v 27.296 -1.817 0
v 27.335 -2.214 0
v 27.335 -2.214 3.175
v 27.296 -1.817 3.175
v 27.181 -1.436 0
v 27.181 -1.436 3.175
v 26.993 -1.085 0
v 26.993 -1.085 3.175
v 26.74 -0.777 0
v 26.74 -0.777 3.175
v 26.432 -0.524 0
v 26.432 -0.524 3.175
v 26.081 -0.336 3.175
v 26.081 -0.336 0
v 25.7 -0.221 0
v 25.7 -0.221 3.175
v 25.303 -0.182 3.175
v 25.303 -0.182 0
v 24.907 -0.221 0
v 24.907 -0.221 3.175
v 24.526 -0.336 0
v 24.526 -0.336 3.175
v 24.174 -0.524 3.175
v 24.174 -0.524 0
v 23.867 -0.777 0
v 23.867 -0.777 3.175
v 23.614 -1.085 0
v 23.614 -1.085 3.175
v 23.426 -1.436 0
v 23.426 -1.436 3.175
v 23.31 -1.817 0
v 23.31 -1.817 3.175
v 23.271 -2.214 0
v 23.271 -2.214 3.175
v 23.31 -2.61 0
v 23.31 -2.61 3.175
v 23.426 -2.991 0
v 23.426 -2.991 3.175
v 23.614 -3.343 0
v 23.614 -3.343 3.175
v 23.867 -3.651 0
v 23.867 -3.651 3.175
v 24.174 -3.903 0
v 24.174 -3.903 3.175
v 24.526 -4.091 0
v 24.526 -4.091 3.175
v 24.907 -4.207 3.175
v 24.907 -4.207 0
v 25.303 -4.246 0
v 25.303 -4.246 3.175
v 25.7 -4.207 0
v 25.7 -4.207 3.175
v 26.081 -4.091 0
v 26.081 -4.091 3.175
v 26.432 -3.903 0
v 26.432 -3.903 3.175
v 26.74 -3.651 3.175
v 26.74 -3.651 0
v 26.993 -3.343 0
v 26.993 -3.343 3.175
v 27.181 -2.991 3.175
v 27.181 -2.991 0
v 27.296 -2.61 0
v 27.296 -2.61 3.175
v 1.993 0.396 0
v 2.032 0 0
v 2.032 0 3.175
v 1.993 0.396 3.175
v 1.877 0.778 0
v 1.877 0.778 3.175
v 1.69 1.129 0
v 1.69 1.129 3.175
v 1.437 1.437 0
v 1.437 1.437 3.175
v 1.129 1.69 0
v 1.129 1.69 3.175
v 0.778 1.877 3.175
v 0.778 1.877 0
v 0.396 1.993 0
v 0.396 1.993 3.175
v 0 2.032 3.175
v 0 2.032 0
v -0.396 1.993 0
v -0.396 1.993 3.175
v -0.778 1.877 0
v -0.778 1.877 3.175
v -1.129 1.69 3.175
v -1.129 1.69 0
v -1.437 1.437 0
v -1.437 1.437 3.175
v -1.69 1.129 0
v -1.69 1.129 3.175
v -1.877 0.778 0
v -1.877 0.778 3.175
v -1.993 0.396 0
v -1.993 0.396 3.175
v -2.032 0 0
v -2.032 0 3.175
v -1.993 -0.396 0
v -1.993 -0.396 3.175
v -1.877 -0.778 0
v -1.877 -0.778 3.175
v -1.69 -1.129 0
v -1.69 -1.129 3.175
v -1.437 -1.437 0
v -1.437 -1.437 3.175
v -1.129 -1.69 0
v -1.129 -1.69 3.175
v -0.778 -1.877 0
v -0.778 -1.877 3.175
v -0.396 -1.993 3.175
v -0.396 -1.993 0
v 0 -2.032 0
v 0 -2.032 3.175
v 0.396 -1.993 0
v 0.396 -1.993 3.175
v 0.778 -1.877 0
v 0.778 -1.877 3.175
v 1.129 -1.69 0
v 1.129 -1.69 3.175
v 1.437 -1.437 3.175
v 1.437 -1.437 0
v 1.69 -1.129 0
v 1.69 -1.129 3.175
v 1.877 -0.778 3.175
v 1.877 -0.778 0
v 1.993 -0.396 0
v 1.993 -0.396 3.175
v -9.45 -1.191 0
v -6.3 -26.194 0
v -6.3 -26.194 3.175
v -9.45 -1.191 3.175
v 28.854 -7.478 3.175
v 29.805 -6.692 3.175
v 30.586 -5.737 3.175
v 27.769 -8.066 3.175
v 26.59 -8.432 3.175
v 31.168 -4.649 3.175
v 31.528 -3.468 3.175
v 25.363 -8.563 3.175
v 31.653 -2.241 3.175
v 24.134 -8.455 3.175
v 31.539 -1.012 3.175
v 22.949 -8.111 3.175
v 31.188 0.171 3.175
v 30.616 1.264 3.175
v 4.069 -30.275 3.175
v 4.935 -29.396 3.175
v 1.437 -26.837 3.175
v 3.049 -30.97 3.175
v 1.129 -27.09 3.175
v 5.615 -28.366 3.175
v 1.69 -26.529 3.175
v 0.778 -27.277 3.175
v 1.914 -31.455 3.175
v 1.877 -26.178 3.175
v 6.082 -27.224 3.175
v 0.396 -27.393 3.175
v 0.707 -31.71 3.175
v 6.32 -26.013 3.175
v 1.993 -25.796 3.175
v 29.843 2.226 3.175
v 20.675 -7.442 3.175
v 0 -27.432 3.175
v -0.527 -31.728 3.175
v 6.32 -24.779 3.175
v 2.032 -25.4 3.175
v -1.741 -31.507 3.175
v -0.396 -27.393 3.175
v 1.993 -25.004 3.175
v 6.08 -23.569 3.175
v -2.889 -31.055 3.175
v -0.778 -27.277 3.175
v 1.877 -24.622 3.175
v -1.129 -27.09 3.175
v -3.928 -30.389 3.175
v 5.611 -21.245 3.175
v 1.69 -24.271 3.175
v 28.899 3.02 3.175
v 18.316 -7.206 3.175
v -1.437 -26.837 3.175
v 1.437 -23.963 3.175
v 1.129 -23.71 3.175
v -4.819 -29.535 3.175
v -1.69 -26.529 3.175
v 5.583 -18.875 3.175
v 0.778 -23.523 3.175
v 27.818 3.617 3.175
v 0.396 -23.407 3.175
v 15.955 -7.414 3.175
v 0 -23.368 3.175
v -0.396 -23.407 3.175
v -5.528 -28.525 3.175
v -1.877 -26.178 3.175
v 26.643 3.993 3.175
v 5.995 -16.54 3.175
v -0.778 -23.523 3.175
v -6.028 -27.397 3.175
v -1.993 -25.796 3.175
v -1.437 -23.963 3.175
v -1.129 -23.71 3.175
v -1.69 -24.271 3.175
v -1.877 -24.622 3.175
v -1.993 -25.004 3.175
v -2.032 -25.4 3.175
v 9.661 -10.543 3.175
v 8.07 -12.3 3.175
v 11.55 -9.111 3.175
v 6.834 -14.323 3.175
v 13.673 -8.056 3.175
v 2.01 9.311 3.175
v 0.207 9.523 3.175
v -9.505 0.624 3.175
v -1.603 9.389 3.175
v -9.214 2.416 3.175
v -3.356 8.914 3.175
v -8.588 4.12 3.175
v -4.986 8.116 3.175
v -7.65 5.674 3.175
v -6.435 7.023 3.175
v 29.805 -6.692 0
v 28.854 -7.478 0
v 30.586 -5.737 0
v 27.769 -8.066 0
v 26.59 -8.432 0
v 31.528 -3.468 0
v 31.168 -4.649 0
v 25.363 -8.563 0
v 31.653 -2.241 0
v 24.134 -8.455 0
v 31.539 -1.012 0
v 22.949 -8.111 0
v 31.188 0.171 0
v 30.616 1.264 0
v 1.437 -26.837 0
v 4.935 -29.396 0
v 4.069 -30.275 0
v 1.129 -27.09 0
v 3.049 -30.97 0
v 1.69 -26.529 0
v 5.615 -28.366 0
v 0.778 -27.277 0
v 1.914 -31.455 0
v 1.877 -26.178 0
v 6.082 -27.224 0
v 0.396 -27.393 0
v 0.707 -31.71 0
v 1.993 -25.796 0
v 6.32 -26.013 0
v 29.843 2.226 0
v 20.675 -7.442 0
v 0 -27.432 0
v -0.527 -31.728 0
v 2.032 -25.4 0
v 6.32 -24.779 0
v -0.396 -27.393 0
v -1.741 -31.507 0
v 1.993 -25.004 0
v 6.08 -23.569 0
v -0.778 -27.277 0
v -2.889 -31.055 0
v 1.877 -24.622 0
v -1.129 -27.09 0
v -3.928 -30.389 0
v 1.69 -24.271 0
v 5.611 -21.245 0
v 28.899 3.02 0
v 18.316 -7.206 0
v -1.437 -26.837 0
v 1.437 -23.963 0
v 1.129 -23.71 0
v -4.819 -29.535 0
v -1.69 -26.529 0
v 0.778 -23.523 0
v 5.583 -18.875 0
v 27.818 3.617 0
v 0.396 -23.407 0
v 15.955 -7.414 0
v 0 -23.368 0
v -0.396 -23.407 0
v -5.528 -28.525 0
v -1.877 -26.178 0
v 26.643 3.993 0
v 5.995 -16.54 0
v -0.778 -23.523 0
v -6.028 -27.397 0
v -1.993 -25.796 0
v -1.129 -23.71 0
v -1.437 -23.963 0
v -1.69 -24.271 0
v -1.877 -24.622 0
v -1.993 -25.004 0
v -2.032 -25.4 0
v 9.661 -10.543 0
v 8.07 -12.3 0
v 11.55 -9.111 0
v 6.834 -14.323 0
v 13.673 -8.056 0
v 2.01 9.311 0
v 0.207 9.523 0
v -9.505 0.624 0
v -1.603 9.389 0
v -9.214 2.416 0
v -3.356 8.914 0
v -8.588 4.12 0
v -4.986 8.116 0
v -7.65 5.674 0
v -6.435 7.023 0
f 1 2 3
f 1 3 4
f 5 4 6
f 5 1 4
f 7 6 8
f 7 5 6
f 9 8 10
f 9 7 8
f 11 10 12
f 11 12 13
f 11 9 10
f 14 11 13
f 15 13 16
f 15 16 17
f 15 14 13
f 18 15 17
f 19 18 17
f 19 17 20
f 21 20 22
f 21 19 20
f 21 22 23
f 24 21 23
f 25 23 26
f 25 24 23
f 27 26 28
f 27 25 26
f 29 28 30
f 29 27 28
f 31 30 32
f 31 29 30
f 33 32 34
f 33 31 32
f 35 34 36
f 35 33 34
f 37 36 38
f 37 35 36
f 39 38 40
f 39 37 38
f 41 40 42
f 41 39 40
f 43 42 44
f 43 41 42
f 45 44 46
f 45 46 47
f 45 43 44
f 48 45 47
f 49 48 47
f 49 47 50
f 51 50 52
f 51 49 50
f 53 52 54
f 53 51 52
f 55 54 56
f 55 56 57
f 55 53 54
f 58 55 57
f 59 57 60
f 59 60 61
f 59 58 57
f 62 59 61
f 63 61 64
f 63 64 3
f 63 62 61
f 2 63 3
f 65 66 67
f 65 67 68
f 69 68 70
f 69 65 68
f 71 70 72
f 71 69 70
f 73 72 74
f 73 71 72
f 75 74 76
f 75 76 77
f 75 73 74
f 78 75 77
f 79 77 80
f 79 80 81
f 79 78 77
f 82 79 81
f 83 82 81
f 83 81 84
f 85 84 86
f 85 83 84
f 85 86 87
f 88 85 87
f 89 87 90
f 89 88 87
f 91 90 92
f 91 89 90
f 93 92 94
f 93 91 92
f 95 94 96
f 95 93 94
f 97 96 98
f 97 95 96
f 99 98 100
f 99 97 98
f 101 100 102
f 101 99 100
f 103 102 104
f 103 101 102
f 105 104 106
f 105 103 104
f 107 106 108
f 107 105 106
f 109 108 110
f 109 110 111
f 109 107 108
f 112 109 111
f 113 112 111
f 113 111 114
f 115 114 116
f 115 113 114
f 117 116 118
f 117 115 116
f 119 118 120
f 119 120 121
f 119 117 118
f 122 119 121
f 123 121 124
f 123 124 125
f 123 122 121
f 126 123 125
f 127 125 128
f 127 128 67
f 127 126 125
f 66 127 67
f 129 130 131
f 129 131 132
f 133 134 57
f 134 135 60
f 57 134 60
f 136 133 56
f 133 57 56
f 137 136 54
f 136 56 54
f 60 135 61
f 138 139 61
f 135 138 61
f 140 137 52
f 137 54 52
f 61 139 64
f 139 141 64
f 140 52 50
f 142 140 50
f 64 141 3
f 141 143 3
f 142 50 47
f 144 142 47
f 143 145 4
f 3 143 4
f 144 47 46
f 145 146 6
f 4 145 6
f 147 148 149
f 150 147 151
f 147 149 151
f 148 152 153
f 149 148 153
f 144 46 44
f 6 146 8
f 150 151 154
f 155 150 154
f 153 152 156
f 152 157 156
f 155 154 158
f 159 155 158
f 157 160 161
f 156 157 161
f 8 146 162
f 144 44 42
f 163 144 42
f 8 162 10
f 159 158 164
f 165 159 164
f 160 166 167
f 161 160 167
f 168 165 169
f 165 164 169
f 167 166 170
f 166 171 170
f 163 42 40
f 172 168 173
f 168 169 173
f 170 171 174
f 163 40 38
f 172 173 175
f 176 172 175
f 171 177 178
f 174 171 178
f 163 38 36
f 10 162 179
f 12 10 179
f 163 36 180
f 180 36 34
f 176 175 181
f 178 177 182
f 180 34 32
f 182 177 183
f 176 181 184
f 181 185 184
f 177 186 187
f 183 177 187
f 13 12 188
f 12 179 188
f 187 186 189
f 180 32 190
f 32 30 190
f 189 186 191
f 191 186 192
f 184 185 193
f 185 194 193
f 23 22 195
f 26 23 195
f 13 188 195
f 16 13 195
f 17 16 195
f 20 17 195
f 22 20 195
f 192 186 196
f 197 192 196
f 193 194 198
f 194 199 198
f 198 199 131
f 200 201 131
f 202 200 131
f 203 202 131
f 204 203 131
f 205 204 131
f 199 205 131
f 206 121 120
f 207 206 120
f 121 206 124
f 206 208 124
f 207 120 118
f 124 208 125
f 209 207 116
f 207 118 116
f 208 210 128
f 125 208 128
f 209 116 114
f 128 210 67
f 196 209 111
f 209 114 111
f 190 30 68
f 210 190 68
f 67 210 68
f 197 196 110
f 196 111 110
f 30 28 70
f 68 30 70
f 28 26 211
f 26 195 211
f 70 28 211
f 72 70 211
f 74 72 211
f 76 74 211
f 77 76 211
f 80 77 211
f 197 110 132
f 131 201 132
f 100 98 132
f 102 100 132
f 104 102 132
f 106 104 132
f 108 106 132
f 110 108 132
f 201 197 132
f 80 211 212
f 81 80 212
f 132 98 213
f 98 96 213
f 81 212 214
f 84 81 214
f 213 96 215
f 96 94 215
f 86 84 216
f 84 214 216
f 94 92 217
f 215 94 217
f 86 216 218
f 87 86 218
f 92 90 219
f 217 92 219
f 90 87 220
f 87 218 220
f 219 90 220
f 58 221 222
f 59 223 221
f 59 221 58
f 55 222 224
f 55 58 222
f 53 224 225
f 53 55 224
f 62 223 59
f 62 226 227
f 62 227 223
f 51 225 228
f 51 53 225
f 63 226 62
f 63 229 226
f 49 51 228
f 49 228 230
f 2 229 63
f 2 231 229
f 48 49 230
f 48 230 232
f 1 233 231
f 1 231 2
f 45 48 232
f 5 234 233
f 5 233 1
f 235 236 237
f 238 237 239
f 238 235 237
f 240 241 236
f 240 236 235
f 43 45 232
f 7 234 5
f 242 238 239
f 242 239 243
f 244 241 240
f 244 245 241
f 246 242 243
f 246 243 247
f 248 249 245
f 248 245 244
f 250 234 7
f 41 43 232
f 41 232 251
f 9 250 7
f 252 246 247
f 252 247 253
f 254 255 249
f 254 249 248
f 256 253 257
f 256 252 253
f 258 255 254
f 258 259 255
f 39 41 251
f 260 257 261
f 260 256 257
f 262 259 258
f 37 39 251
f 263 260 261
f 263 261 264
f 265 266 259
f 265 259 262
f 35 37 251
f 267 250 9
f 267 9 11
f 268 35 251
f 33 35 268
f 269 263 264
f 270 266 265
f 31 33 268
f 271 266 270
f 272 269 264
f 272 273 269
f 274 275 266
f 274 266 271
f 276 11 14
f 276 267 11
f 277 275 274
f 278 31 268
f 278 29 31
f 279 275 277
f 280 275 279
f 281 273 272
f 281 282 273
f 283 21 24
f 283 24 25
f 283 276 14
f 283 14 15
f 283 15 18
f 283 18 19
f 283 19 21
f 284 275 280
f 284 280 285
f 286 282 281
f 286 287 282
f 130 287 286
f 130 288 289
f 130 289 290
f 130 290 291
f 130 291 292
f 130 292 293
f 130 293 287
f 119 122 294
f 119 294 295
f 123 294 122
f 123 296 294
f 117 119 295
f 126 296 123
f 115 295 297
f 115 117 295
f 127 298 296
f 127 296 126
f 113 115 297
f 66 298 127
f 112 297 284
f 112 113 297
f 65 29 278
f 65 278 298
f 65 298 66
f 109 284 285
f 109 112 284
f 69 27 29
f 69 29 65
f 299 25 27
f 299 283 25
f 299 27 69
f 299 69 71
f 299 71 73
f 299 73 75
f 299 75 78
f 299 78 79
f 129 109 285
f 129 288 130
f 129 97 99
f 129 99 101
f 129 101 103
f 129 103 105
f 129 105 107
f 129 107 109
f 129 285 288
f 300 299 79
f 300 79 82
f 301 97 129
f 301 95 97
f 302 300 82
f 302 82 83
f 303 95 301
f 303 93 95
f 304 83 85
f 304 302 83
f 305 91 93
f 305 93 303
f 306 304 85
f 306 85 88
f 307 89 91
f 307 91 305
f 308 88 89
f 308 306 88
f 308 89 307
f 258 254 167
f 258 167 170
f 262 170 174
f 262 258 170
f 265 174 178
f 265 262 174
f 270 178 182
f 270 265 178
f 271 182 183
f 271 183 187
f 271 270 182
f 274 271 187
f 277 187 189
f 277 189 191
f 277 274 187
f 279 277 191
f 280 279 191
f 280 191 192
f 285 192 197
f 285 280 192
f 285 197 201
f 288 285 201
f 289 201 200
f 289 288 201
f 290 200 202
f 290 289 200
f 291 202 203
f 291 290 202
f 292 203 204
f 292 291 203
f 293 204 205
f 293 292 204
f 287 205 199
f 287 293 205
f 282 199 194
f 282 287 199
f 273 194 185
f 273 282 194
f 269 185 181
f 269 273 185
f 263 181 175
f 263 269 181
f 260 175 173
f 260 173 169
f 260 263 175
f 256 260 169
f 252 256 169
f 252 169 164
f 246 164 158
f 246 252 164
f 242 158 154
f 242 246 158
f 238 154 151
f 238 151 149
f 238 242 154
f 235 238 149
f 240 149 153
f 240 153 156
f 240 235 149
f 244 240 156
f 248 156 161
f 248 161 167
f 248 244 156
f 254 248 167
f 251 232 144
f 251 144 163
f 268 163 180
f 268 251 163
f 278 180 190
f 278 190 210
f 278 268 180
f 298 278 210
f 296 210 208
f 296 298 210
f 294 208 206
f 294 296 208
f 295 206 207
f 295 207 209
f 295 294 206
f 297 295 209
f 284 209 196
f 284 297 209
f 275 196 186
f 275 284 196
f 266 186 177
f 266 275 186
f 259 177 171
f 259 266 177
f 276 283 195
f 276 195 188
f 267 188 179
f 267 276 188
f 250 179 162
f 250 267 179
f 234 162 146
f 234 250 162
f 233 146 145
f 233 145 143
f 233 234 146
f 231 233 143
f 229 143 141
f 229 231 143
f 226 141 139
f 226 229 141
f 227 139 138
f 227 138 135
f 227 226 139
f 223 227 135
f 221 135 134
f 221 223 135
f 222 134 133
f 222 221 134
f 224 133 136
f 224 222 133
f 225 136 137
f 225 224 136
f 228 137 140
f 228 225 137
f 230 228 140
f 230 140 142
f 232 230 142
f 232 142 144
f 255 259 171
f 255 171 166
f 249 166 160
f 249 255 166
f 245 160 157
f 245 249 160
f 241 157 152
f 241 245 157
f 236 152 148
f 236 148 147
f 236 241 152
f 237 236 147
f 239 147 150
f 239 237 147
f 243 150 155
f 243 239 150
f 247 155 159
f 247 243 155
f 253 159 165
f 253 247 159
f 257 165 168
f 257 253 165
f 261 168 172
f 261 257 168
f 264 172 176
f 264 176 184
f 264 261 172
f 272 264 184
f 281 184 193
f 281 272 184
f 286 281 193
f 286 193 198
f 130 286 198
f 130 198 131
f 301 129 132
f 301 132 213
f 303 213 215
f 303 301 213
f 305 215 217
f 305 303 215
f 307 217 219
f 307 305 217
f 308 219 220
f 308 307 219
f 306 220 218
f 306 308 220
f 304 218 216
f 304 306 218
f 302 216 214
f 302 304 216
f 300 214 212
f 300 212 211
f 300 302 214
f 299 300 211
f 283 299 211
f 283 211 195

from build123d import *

# Parameters (mm, degrees)
SKETCH1_R           = 2.032
BOSS_EXTRUDE1_DEPTH = 3.175


with BuildPart() as part:
    # Sketch1 → Boss-Extrude1 (new body)
    with BuildSketch(Plane.XY):
        with BuildLine():
            Line((-6.300195309, -26.19375), (-9.450292964, -1.190625))
            ThreePointArc((-9.450292964, -1.190625), (-6.434996728, 7.022566633), (2.009741615, 9.31056194))
            Line((2.009741615, 9.31056194), (26.643173075, 3.993285428))
            ThreePointArc((26.643173075, 3.993285428), (31.376812055, -4.067266578), (22.949101168, -8.111215863))
            ThreePointArc((22.949101168, -8.111215863), (9.660617203, -10.542713679), (6.08020428, -23.568711952))
            ThreePointArc((6.08020428, -23.568711952), (1.317120041, -31.611899452), (-6.300195309, -26.19375))
        make_face()
        Circle(SKETCH1_R, mode=Mode.SUBTRACT)
        with Locations((25.303345332, -2.213755866)):
            Circle(SKETCH1_R, mode=Mode.SUBTRACT)
        with Locations((0, -25.4)):
            Circle(SKETCH1_R, mode=Mode.SUBTRACT)
    extrude(amount=BOSS_EXTRUDE1_DEPTH)


solid = part.part
